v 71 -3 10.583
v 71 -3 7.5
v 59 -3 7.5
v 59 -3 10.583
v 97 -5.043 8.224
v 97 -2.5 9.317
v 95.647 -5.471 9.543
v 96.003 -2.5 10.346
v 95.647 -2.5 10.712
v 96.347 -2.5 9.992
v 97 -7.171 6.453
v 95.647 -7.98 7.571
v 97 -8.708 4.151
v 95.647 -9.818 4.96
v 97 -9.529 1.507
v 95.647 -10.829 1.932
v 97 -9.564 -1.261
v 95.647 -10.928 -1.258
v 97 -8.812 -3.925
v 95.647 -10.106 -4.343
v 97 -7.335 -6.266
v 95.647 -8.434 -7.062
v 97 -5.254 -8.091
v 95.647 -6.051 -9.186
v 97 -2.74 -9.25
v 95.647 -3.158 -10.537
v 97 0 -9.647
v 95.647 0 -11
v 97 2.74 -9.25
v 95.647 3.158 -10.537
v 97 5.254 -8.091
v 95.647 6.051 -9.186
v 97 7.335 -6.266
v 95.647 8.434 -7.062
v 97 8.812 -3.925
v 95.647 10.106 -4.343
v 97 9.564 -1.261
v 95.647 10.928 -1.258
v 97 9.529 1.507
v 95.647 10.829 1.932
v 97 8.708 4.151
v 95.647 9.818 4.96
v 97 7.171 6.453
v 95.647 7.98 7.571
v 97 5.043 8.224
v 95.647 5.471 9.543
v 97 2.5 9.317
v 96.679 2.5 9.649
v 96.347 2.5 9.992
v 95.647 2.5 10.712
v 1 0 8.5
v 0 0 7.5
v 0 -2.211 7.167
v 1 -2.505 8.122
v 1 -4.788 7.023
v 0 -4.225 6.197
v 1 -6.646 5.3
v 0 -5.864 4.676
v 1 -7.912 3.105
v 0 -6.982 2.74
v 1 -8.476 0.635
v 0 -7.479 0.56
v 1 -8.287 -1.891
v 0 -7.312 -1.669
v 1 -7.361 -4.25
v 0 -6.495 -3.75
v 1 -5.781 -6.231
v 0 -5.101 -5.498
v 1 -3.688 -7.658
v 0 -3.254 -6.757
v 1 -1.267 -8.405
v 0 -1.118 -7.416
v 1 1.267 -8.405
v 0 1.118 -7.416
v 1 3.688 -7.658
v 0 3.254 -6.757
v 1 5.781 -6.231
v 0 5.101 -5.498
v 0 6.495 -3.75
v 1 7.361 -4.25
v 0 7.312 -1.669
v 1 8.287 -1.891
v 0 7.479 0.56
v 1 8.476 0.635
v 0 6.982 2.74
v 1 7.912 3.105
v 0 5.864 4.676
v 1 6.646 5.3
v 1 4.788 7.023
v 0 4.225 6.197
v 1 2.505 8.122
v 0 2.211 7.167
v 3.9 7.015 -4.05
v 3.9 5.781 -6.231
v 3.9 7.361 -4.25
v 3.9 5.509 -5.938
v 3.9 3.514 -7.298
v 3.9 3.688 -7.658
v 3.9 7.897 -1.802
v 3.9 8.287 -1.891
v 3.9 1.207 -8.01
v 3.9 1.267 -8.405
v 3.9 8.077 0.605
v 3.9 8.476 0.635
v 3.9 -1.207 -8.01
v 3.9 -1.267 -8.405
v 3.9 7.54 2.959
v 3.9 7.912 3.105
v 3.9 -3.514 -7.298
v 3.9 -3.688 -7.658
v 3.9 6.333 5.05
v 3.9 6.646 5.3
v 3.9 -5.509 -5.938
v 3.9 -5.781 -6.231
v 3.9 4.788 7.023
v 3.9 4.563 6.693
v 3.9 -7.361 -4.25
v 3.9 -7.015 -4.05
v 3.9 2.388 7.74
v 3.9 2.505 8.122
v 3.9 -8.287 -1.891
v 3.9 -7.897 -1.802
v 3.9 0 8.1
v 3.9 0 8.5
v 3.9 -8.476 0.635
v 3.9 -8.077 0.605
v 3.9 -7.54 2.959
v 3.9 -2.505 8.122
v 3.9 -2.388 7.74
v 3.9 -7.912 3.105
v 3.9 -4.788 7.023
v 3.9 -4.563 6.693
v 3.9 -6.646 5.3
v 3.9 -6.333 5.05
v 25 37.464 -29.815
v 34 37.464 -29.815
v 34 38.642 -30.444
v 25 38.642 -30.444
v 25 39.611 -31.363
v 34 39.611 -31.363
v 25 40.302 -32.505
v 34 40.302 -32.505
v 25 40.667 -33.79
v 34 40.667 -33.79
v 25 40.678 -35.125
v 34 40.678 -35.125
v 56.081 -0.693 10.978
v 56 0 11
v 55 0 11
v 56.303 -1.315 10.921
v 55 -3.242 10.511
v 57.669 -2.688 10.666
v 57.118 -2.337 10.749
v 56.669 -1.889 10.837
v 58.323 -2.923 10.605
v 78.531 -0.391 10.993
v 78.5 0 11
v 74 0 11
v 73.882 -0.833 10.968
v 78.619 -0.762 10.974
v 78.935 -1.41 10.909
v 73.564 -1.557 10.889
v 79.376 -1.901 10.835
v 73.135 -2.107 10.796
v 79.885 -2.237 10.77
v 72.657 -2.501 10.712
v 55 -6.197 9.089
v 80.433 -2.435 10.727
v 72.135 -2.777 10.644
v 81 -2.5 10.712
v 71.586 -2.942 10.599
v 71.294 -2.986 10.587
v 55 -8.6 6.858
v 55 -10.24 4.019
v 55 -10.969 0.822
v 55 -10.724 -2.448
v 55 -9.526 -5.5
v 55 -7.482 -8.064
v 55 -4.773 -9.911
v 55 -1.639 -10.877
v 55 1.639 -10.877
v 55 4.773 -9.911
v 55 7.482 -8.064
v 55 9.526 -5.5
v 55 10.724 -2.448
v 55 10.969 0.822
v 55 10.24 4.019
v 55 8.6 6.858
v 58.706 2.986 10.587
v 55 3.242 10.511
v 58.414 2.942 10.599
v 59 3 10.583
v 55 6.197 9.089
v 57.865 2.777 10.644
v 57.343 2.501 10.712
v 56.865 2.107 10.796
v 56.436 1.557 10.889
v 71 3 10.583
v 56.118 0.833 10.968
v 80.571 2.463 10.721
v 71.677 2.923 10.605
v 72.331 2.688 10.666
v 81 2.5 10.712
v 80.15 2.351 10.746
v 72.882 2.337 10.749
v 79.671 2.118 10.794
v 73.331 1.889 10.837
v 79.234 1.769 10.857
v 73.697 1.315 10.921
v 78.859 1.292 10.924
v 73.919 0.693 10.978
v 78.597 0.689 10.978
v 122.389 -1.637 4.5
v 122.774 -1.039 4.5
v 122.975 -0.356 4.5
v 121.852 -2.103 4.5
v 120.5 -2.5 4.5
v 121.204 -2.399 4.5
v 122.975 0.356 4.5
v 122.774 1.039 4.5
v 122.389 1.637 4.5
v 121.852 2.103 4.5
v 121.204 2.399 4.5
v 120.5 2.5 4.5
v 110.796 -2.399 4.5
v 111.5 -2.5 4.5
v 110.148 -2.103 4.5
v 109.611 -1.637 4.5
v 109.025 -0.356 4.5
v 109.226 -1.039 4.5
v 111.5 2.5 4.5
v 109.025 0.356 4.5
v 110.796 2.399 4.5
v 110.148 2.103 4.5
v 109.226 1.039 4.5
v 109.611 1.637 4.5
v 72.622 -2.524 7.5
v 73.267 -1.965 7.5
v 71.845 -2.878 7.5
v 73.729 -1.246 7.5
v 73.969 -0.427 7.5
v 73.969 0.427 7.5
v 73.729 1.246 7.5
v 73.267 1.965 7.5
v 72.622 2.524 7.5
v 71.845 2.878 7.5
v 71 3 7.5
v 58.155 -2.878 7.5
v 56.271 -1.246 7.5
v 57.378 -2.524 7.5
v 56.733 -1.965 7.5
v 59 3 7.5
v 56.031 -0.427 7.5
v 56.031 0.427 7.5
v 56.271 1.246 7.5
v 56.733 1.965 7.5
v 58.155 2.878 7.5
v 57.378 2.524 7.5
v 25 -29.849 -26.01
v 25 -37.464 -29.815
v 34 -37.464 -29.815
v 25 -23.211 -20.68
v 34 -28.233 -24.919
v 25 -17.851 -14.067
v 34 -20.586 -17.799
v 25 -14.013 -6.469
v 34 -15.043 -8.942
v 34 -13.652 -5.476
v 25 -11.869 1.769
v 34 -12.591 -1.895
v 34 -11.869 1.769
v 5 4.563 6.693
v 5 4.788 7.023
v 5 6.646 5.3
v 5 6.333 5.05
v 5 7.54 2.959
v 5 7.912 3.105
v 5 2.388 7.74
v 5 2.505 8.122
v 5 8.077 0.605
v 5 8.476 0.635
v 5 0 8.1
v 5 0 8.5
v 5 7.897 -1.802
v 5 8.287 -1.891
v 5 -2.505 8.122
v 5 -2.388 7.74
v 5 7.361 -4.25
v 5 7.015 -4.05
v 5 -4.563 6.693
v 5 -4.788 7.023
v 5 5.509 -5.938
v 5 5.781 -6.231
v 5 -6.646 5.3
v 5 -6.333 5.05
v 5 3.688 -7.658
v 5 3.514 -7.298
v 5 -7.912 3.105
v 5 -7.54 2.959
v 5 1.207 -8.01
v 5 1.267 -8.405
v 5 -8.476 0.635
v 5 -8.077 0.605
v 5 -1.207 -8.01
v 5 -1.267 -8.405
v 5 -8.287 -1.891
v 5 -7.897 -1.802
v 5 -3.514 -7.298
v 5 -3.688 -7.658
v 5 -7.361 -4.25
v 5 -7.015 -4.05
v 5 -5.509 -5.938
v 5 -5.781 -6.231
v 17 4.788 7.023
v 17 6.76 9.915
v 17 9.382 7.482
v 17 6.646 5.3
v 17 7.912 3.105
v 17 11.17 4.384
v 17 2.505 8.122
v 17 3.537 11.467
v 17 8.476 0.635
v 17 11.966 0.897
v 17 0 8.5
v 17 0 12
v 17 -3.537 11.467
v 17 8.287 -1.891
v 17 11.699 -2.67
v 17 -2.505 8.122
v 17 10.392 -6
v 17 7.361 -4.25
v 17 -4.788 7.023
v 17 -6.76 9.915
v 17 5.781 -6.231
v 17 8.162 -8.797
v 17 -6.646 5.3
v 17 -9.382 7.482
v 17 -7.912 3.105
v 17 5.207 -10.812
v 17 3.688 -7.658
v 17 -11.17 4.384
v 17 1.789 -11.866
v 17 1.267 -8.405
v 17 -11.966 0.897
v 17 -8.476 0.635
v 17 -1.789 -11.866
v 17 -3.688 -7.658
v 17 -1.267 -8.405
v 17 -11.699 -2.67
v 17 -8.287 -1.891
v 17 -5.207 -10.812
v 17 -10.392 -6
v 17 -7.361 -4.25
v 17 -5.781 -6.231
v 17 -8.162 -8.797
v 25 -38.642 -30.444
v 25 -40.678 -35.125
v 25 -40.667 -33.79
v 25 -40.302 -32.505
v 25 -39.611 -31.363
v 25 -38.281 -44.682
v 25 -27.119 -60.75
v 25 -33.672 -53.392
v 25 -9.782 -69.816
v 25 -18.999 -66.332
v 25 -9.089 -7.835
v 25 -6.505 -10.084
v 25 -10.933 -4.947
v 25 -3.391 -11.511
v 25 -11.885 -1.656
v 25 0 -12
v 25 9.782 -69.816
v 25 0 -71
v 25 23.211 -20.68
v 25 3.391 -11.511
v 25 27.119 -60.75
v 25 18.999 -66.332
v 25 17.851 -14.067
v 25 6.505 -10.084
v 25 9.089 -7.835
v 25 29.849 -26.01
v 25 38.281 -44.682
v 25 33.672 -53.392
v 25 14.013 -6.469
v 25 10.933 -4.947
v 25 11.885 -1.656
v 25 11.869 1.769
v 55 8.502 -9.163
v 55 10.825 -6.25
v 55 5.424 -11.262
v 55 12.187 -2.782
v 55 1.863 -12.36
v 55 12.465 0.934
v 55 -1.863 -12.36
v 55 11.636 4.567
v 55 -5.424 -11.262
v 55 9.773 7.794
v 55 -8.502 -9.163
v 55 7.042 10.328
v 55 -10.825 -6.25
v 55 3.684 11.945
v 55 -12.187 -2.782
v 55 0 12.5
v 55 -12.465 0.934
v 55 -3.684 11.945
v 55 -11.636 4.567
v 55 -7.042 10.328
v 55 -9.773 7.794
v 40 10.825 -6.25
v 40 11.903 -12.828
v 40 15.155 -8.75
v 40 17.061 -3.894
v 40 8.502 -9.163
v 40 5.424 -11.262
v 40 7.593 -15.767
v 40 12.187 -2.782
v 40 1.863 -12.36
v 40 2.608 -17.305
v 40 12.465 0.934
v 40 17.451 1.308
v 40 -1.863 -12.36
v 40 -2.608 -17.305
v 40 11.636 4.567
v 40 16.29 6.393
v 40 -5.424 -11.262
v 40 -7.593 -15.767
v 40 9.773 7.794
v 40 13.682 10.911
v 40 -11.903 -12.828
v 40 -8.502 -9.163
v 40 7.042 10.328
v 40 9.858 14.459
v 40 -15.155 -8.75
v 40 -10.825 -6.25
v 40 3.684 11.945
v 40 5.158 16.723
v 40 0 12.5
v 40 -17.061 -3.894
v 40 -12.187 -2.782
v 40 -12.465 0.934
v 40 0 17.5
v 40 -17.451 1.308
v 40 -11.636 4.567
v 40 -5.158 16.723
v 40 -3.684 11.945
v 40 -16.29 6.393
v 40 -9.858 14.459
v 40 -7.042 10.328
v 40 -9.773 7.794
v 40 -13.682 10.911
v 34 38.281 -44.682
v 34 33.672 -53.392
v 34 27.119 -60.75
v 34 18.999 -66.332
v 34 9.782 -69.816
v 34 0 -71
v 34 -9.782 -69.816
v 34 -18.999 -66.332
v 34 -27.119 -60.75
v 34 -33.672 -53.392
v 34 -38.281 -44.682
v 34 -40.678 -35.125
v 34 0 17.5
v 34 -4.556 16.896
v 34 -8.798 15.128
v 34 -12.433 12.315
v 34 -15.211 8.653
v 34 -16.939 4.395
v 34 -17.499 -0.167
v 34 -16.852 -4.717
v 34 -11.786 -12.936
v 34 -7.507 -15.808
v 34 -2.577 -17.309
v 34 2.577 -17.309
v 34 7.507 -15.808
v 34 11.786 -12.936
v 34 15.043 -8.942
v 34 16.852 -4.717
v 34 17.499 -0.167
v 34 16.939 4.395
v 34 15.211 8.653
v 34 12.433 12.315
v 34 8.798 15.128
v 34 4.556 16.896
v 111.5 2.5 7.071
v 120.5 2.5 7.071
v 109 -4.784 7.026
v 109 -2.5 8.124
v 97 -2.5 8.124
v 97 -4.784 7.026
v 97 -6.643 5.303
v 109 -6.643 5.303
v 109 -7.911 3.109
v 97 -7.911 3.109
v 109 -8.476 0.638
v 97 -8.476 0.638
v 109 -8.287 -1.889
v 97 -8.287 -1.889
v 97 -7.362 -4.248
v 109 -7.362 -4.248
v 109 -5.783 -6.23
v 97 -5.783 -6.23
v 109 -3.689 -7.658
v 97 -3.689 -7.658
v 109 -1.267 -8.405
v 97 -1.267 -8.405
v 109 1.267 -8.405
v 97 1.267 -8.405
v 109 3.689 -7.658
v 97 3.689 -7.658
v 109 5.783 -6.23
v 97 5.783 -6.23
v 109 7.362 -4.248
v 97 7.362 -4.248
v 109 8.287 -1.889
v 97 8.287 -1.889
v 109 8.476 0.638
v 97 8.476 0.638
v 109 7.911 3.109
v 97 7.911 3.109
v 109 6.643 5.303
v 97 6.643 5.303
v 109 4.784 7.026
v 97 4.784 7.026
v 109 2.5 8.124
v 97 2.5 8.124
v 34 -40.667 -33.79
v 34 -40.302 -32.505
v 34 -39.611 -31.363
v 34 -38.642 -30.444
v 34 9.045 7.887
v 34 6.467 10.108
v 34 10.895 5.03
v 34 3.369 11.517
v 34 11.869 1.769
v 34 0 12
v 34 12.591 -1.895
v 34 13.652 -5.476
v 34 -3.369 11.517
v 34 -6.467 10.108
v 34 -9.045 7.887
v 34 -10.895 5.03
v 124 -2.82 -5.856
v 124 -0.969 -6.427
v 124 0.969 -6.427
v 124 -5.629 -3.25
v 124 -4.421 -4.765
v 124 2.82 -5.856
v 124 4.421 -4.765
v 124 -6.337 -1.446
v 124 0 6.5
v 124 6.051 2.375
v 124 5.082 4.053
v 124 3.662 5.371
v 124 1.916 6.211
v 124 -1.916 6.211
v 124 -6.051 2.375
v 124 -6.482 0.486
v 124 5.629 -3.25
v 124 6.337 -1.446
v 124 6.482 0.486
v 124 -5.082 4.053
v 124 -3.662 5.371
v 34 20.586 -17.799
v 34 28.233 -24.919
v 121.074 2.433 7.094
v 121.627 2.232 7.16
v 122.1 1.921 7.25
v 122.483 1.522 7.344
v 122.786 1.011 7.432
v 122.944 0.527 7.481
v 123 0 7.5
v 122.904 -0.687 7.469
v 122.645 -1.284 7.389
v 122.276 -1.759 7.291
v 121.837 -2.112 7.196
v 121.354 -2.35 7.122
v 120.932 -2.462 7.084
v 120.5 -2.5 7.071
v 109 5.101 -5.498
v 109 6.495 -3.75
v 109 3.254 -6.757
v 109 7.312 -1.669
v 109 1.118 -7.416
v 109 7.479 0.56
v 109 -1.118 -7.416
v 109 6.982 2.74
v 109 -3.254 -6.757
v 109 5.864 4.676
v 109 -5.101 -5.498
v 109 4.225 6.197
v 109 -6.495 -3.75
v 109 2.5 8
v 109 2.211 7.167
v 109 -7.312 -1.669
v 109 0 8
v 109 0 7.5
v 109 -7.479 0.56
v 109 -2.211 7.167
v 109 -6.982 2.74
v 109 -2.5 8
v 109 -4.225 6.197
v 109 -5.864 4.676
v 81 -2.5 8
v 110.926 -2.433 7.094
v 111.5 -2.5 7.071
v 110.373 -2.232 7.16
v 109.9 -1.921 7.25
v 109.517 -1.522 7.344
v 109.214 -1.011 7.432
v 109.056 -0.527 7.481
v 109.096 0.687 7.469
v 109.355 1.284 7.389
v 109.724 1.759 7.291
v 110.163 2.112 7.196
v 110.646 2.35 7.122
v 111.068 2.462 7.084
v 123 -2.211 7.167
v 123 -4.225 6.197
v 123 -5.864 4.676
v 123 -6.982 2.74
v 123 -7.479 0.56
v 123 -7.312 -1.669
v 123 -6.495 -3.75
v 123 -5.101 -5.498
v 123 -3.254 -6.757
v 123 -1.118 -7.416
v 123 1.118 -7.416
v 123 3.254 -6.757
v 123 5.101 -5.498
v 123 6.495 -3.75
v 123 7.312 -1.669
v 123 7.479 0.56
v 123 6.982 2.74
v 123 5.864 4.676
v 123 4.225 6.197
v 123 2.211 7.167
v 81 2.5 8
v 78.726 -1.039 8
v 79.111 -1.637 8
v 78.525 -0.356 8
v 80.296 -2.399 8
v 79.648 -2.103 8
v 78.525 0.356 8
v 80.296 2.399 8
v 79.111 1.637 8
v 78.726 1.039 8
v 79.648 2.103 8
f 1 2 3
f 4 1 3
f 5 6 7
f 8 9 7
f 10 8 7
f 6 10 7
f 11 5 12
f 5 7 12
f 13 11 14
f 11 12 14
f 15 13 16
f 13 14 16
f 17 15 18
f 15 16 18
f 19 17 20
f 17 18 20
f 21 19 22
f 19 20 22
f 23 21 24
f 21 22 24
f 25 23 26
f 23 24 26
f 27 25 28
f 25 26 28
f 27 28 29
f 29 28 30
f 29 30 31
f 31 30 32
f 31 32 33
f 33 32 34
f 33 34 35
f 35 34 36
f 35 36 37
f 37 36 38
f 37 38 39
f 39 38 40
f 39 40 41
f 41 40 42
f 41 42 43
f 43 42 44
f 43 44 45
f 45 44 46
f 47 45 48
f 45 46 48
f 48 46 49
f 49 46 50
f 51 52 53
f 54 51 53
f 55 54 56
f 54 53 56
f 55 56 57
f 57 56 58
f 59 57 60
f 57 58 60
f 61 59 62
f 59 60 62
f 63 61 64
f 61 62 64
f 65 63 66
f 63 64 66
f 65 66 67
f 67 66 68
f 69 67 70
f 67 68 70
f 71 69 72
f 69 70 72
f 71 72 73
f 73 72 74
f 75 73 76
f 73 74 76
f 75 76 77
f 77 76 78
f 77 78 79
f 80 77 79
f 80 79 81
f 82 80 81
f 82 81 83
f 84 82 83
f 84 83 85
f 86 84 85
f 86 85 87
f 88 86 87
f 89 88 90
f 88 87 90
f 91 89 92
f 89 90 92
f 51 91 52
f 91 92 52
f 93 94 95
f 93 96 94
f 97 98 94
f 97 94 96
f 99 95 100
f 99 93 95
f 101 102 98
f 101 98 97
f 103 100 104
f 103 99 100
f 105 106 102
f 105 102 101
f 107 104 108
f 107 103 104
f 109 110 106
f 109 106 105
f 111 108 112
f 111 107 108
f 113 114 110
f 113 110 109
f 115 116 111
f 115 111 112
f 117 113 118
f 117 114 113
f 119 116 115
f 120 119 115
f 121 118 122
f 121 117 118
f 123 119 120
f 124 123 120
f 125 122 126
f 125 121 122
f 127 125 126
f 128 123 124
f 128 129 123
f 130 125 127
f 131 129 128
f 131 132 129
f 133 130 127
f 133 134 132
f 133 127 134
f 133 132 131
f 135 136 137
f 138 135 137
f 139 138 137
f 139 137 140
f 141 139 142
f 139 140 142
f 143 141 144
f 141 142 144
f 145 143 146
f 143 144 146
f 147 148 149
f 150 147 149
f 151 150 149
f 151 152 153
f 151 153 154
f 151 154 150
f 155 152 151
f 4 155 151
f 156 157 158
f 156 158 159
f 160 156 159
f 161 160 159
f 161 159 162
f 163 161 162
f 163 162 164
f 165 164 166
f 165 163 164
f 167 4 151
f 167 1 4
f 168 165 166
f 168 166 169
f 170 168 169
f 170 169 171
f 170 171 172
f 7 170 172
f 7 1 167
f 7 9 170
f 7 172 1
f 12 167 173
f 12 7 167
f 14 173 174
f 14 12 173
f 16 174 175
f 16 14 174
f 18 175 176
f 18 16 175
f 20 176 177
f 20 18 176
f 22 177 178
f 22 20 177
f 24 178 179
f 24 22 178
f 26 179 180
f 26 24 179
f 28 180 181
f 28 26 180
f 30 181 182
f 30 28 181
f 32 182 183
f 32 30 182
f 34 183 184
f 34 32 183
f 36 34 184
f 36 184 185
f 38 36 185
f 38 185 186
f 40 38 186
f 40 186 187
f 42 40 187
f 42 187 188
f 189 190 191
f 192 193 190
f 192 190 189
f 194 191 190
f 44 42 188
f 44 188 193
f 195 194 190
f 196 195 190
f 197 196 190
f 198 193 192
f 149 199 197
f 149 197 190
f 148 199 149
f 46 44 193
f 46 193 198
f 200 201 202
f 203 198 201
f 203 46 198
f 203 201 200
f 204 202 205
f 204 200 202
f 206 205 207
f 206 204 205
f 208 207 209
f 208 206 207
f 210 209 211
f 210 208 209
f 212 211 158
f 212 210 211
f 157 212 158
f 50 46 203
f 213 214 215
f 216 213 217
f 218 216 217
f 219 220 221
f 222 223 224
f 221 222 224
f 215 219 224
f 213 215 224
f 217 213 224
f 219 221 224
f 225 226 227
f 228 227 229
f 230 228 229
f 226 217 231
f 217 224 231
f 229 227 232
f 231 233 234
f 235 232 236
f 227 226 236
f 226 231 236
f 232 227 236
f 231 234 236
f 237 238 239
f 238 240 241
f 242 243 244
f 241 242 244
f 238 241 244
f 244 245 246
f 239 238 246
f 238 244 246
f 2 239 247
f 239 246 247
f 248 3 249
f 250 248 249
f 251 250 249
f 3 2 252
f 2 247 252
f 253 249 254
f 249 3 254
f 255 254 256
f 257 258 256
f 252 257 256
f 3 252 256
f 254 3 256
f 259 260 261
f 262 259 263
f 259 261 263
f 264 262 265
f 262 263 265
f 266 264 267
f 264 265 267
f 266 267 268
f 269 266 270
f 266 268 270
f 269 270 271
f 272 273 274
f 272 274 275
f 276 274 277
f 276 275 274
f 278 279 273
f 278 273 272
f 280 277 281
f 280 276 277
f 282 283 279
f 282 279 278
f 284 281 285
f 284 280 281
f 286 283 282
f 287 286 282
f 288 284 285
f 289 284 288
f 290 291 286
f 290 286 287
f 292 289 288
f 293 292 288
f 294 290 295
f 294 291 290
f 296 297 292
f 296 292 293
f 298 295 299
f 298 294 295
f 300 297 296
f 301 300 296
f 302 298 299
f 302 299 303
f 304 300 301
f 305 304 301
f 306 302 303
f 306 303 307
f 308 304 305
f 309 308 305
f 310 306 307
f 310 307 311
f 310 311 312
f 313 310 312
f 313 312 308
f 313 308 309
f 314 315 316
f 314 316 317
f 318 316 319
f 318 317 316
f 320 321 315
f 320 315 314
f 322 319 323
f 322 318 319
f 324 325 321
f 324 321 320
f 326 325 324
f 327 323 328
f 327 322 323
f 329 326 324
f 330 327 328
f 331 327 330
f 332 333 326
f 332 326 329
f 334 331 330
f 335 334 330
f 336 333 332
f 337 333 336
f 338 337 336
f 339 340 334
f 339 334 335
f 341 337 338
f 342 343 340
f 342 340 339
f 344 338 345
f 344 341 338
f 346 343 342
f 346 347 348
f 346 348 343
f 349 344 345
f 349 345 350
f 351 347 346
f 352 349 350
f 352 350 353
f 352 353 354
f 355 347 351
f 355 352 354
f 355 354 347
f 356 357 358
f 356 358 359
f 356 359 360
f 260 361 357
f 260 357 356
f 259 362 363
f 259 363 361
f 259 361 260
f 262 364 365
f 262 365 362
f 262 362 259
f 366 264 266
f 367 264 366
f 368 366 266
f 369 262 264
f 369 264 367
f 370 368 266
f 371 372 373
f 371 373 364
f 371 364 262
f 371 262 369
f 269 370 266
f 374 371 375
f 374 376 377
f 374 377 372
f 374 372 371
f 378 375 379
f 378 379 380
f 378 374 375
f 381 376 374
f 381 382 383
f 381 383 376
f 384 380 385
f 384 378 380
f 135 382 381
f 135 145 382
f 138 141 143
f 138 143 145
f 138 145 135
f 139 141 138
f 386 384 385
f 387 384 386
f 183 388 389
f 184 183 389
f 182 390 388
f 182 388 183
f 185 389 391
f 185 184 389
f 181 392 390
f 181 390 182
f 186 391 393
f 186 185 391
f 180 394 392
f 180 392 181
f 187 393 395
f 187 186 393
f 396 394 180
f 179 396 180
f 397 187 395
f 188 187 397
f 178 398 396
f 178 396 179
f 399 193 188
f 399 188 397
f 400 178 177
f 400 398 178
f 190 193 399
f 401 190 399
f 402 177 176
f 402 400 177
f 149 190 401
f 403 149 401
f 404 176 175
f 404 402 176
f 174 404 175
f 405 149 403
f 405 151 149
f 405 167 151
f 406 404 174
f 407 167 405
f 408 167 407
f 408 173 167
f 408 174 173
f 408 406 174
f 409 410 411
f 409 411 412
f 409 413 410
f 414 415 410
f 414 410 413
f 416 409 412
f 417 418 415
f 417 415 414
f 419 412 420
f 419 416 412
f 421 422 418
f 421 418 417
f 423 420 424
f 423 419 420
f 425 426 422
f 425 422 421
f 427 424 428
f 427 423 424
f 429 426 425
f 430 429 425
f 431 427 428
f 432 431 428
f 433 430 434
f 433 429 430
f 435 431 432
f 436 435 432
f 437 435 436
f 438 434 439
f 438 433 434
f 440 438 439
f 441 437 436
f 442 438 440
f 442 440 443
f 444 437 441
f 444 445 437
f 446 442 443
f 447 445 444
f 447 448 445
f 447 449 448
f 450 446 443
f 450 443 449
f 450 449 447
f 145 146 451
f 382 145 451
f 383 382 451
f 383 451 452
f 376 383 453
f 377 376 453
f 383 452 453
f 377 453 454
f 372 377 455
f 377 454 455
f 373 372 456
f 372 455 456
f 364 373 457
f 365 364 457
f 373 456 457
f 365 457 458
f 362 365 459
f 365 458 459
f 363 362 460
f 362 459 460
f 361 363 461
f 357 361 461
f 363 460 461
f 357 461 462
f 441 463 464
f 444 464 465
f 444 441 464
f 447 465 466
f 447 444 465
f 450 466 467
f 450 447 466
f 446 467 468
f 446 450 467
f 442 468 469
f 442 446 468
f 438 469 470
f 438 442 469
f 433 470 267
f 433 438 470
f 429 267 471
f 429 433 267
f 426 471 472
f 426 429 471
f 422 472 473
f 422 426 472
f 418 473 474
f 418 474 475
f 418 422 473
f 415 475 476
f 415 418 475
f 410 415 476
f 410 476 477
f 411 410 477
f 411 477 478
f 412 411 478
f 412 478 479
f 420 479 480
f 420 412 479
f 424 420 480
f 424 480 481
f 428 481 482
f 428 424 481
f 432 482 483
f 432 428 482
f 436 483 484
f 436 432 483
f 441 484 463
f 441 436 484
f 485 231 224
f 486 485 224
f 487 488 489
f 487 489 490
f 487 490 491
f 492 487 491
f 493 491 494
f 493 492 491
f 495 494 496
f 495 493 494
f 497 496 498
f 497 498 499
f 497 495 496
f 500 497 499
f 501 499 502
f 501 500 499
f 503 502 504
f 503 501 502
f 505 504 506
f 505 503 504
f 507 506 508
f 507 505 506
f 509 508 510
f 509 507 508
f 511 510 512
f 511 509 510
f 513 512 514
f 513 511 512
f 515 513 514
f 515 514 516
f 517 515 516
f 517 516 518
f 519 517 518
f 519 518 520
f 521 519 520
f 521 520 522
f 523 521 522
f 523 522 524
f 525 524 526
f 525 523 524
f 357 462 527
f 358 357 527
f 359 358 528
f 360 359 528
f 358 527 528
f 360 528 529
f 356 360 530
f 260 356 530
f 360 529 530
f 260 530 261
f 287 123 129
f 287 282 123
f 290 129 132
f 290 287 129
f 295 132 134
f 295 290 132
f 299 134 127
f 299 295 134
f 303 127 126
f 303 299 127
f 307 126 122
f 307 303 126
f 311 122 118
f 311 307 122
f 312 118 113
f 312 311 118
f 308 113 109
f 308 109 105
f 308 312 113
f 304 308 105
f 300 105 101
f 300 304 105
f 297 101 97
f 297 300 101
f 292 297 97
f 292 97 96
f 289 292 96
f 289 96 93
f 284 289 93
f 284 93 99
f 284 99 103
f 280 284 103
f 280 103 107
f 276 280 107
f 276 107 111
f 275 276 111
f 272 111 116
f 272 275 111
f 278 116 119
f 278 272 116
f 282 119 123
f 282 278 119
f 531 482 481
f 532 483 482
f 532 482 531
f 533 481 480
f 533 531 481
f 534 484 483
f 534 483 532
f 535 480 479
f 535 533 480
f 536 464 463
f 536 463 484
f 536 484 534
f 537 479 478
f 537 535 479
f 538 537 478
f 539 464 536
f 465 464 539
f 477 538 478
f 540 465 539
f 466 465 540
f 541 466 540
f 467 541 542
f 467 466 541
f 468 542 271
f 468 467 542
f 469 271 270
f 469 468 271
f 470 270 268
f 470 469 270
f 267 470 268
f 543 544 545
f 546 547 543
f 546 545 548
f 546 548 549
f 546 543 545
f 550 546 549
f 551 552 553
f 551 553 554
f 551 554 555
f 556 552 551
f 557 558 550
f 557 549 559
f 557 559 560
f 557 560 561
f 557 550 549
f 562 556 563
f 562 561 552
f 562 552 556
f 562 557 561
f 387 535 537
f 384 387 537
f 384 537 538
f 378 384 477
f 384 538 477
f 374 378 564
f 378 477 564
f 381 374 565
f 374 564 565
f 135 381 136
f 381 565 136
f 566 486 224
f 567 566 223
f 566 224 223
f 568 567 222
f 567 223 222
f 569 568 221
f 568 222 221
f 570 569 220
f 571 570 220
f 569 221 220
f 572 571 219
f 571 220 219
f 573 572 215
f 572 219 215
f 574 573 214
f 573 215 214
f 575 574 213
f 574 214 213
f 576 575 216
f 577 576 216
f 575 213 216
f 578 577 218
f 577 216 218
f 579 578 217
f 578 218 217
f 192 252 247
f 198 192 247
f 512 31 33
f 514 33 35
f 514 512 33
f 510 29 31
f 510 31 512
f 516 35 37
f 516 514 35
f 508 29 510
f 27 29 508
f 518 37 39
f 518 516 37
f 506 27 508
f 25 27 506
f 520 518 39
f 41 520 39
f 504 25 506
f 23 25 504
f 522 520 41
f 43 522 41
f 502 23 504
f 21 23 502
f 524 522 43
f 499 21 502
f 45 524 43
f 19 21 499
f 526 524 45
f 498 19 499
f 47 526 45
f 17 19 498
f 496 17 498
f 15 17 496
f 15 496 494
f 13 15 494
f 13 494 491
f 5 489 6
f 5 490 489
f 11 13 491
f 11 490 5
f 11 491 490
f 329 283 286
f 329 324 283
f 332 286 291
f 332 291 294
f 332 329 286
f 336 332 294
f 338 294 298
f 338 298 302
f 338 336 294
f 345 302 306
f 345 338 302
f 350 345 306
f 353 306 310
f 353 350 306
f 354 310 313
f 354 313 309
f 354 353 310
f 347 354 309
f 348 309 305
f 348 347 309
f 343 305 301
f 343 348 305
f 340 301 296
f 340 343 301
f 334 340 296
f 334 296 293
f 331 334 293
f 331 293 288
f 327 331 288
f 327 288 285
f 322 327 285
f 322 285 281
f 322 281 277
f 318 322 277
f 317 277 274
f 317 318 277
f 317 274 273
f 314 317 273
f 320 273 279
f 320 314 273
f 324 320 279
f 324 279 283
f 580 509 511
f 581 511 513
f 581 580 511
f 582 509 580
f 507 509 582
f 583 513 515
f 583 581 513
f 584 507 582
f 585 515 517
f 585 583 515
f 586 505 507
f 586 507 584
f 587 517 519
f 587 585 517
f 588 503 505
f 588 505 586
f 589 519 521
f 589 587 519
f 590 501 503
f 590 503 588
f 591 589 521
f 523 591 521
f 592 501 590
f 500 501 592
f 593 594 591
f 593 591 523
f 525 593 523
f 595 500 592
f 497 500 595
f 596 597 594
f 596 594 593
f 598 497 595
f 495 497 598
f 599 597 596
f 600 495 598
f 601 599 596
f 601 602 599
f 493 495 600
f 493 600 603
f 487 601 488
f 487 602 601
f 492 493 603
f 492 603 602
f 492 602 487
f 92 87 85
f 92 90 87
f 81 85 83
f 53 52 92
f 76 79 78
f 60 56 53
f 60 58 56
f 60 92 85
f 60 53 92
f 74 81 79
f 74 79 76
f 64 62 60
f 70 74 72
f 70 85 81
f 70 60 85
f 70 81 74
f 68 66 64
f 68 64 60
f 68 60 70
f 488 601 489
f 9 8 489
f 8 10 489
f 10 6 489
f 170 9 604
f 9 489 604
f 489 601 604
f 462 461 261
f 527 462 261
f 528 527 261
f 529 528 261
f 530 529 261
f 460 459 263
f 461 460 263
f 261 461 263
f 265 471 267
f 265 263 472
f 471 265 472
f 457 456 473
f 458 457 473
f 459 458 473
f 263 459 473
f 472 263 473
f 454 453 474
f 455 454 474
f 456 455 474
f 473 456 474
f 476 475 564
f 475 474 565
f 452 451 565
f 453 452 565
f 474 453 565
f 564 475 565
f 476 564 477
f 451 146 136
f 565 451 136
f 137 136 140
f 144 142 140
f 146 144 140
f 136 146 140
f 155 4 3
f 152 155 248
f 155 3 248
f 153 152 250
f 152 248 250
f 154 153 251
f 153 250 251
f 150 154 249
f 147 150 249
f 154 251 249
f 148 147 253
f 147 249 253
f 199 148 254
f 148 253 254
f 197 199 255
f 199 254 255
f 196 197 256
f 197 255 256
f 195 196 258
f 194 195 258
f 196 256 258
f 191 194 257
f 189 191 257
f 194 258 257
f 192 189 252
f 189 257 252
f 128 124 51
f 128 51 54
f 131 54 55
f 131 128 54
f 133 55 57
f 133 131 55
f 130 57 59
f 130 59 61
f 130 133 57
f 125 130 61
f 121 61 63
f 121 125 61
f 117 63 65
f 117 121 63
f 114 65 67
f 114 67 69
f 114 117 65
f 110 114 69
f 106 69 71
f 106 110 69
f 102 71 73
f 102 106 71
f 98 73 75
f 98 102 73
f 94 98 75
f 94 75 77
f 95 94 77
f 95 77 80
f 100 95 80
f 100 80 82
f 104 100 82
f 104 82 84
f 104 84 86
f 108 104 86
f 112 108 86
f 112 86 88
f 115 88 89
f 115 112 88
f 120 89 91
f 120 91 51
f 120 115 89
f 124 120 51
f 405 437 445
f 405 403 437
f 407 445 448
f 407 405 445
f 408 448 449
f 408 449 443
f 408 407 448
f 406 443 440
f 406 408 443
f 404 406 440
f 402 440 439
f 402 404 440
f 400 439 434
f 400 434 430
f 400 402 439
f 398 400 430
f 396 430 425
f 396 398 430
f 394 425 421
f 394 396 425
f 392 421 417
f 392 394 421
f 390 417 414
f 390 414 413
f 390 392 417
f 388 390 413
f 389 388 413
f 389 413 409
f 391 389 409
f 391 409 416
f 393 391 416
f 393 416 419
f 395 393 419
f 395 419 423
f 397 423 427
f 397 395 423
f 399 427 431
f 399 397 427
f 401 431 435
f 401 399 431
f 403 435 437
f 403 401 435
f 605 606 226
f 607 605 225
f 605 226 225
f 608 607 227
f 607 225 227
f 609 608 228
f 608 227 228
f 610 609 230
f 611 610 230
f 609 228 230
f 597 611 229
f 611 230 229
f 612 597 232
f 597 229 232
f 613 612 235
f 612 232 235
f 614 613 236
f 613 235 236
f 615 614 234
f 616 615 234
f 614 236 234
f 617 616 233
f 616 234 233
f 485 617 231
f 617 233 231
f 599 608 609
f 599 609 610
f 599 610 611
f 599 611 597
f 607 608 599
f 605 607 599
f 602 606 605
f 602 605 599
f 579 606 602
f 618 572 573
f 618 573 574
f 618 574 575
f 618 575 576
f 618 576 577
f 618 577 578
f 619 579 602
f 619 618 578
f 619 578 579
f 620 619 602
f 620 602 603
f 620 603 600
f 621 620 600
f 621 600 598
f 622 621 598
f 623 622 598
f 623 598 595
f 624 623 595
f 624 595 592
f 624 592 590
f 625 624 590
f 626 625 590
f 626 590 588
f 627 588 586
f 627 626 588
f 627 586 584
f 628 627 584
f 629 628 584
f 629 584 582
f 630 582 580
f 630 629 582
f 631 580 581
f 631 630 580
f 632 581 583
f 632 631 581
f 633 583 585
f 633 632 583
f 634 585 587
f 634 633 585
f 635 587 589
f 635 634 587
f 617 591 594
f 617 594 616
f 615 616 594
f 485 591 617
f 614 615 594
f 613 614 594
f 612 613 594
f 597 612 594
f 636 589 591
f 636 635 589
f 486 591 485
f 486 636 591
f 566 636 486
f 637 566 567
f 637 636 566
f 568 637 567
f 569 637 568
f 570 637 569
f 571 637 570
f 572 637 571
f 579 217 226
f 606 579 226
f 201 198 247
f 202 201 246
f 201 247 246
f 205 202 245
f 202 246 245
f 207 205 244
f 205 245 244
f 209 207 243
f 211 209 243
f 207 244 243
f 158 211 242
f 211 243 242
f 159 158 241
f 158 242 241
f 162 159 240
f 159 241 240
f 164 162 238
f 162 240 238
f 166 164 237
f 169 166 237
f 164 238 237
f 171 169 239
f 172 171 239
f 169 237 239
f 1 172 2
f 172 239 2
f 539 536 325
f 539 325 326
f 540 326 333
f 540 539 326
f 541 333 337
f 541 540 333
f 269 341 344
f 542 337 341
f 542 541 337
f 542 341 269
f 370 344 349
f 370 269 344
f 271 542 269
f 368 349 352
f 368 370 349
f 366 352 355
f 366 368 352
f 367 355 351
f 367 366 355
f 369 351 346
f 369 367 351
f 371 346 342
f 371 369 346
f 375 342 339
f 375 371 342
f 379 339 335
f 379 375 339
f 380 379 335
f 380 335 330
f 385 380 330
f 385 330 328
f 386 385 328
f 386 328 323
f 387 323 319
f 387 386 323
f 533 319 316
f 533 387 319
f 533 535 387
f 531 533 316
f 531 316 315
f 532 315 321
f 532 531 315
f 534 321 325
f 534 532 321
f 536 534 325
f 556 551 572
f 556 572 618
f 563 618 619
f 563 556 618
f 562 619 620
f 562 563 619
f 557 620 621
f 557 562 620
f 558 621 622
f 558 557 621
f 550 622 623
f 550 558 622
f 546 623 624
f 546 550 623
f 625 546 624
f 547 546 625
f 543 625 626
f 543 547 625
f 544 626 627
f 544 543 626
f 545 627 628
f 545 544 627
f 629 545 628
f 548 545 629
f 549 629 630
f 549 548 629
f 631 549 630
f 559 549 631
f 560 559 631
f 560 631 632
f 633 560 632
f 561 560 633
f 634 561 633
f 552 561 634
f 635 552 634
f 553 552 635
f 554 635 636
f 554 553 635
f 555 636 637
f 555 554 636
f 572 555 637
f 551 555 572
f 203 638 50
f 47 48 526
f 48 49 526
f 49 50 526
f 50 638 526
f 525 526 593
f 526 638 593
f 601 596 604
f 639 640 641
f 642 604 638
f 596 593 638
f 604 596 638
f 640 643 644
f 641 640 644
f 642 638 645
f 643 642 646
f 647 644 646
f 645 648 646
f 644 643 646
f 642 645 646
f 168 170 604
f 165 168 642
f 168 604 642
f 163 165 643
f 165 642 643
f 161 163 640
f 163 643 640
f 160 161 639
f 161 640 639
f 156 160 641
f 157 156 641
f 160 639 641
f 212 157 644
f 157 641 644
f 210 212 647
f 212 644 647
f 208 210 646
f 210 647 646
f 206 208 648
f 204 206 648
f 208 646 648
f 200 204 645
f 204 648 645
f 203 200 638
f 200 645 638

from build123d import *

# Parameters (mm, degrees)
EXTRUDE_1_DEPTH     = 9
CUT_EXTRUDE_START   = 7.5
CUT_EXTRUDE_1_DEPTH = 142.076331988
CUT_EXTRUDE_START_2 = 8
CUT_EXTRUDE_2_DEPTH = 141.576331988
CUT_EXTRUDE_START_3 = 4.5
CUT_EXTRUDE_3_DEPTH = 145.076331988
CHAMFER_1_SIZE      = 1


# Read off the part's stored shape, not the designer's step: M22 机械螺纹 螺柱1
with BuildPart() as part:
    # 草图1 → 旋转1 (revolve)
    with BuildSketch(Plane.XY, mode=Mode.PRIVATE) as revolve_1_sk:
        Polygon((0, 0), (0, 8.5), (3.9, 8.5), (3.9, 8.1), (5, 8.1), (5, 8.5), (17, 8.5), (17, 12), (34, 12), (34, 17.5), (40, 17.5), (40, 12.5), (55, 12.5), (55, 11), (97, 11), (97, 8.5), (109, 8.5), (109, 7.5), (124, 7.5), (124, 0), align=None)
    revolve(revolve_1_sk.sketch.rotate(Axis((0, 0, 0), (1, 0, 0)), 90), axis=Axis((0, 0, 0), (1, 0, 0)))

    # 草图2 → 凸台-拉伸1 (add)
    with BuildSketch(Plane.ZY.offset(-34)):
        with BuildLine():
            ThreePointArc((1.769346299, -11.868842137), (-12, 0), (1.769346299, 11.868842137))
            ThreePointArc((1.769346299, 11.868842137), (-17.516638735, 20.354713861), (-29.814759189, 37.463643428))
            ThreePointArc((-29.814759189, 37.463643428), (-31.910579937, 39.994896928), (-35.125, 40.678426408))
            ThreePointArc((-35.125, 40.678426408), (-71, 0), (-35.125, -40.678426408))
            ThreePointArc((-35.125, -40.678426408), (-31.910579937, -39.994896928), (-29.814759189, -37.463643428))
            ThreePointArc((-29.814759189, -37.463643428), (-17.516638735, -20.354713861), (1.769346299, -11.868842137))
        make_face()
    extrude(amount=EXTRUDE_1_DEPTH)

    # 草图3 → 切除-拉伸1 (cut, through all)
    with BuildSketch(Plane.XY.offset(CUT_EXTRUDE_START)):
        with BuildLine():
            Line((59, 3), (71, 3))
            ThreePointArc((71, 3), (74, 0), (71, -3))
            Line((71, -3), (59, -3))
            ThreePointArc((59, -3), (56, 0), (59, 3))
        make_face()
    extrude(amount=CUT_EXTRUDE_1_DEPTH, mode=Mode.SUBTRACT)

    # M22 机械螺纹 螺柱1 outline → M22 机械螺纹 螺柱1 (revolve, cut)
    with BuildSketch(Plane.YX):
        Polygon((11, 97), (9.647, 97), (11, 95.647), align=None)
    revolve(axis=Axis((0, 0, 0), (1, 0, 0)), mode=Mode.SUBTRACT)

    # 草图4 → 切除-拉伸2 (cut, through all)
    with BuildSketch(Plane.XY.offset(CUT_EXTRUDE_START_2)):
        with BuildLine():
            Line((81, 2.5), (110.572522736, 2.5))
            ThreePointArc((110.572522736, 2.5), (113.072522736, 0), (110.572522736, -2.5))
            Line((110.572522736, -2.5), (81, -2.5))
            ThreePointArc((81, -2.5), (78.5, 0), (81, 2.5))
        make_face()
    extrude(amount=CUT_EXTRUDE_2_DEPTH, mode=Mode.SUBTRACT)

    # 草图6 → 切除-拉伸3 (cut, through all)
    with BuildSketch(Plane.XY.offset(CUT_EXTRUDE_START_3)):
        with BuildLine():
            Line((111.5, 2.5), (120.5, 2.5))
            ThreePointArc((120.5, 2.5), (123, 0), (120.5, -2.5))
            Line((120.5, -2.5), (111.5, -2.5))
            ThreePointArc((111.5, -2.5), (109, 0), (111.5, 2.5))
        make_face()
    extrude(amount=CUT_EXTRUDE_3_DEPTH, mode=Mode.SUBTRACT)

    # 倒角1
    chamfer_1_edges = [part.edges().sort_by_distance(p)[0] for p in [
        (124, 0, -7.5),
        (0, 0, -8.5),
    ]]
    chamfer(chamfer_1_edges, length=CHAMFER_1_SIZE)


solid = part.part
